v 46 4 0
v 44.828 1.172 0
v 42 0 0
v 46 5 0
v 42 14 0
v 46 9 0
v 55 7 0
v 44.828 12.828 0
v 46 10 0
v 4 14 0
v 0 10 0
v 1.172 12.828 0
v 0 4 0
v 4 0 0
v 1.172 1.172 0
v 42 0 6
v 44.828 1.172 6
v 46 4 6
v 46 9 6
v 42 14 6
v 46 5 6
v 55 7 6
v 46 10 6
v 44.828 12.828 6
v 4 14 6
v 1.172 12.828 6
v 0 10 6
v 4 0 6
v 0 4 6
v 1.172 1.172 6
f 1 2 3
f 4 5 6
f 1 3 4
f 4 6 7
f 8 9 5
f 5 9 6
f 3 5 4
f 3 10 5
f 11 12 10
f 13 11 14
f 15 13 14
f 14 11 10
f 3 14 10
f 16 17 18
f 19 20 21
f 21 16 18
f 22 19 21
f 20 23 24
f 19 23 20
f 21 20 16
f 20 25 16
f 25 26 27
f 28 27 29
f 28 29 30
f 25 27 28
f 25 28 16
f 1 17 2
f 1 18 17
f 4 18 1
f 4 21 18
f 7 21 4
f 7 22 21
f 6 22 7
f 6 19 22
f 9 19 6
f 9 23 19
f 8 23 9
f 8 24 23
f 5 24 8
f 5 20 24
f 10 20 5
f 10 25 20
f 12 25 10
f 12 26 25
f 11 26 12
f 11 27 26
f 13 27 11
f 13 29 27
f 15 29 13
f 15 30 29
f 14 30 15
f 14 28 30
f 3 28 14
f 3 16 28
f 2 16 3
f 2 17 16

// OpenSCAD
$fn = 32;

// ----------------------------------------------------------------------
// Ratchet pawl: 46 x 14 mm body, beak 9 mm с правого торца
// ----------------------------------------------------------------------

// --- parameters (mm) ---
profile_height = 6;       // extrusion height
profile_points = 15;      // points of the closed outline

profile = [[0, 4], [1.172, 1.172], [4, 0], [42, 0], [44.828, 1.172], [46, 4], [46, 5], [55, 7], [46, 9], [46, 10], [44.828, 12.828], [42, 14], [4, 14], [1.172, 12.828], [0, 10]];  // single closed polygon, 15 points, counter clockwise

// --- the one profile operation ---
linear_extrude(height = profile_height) polygon(points = profile);
